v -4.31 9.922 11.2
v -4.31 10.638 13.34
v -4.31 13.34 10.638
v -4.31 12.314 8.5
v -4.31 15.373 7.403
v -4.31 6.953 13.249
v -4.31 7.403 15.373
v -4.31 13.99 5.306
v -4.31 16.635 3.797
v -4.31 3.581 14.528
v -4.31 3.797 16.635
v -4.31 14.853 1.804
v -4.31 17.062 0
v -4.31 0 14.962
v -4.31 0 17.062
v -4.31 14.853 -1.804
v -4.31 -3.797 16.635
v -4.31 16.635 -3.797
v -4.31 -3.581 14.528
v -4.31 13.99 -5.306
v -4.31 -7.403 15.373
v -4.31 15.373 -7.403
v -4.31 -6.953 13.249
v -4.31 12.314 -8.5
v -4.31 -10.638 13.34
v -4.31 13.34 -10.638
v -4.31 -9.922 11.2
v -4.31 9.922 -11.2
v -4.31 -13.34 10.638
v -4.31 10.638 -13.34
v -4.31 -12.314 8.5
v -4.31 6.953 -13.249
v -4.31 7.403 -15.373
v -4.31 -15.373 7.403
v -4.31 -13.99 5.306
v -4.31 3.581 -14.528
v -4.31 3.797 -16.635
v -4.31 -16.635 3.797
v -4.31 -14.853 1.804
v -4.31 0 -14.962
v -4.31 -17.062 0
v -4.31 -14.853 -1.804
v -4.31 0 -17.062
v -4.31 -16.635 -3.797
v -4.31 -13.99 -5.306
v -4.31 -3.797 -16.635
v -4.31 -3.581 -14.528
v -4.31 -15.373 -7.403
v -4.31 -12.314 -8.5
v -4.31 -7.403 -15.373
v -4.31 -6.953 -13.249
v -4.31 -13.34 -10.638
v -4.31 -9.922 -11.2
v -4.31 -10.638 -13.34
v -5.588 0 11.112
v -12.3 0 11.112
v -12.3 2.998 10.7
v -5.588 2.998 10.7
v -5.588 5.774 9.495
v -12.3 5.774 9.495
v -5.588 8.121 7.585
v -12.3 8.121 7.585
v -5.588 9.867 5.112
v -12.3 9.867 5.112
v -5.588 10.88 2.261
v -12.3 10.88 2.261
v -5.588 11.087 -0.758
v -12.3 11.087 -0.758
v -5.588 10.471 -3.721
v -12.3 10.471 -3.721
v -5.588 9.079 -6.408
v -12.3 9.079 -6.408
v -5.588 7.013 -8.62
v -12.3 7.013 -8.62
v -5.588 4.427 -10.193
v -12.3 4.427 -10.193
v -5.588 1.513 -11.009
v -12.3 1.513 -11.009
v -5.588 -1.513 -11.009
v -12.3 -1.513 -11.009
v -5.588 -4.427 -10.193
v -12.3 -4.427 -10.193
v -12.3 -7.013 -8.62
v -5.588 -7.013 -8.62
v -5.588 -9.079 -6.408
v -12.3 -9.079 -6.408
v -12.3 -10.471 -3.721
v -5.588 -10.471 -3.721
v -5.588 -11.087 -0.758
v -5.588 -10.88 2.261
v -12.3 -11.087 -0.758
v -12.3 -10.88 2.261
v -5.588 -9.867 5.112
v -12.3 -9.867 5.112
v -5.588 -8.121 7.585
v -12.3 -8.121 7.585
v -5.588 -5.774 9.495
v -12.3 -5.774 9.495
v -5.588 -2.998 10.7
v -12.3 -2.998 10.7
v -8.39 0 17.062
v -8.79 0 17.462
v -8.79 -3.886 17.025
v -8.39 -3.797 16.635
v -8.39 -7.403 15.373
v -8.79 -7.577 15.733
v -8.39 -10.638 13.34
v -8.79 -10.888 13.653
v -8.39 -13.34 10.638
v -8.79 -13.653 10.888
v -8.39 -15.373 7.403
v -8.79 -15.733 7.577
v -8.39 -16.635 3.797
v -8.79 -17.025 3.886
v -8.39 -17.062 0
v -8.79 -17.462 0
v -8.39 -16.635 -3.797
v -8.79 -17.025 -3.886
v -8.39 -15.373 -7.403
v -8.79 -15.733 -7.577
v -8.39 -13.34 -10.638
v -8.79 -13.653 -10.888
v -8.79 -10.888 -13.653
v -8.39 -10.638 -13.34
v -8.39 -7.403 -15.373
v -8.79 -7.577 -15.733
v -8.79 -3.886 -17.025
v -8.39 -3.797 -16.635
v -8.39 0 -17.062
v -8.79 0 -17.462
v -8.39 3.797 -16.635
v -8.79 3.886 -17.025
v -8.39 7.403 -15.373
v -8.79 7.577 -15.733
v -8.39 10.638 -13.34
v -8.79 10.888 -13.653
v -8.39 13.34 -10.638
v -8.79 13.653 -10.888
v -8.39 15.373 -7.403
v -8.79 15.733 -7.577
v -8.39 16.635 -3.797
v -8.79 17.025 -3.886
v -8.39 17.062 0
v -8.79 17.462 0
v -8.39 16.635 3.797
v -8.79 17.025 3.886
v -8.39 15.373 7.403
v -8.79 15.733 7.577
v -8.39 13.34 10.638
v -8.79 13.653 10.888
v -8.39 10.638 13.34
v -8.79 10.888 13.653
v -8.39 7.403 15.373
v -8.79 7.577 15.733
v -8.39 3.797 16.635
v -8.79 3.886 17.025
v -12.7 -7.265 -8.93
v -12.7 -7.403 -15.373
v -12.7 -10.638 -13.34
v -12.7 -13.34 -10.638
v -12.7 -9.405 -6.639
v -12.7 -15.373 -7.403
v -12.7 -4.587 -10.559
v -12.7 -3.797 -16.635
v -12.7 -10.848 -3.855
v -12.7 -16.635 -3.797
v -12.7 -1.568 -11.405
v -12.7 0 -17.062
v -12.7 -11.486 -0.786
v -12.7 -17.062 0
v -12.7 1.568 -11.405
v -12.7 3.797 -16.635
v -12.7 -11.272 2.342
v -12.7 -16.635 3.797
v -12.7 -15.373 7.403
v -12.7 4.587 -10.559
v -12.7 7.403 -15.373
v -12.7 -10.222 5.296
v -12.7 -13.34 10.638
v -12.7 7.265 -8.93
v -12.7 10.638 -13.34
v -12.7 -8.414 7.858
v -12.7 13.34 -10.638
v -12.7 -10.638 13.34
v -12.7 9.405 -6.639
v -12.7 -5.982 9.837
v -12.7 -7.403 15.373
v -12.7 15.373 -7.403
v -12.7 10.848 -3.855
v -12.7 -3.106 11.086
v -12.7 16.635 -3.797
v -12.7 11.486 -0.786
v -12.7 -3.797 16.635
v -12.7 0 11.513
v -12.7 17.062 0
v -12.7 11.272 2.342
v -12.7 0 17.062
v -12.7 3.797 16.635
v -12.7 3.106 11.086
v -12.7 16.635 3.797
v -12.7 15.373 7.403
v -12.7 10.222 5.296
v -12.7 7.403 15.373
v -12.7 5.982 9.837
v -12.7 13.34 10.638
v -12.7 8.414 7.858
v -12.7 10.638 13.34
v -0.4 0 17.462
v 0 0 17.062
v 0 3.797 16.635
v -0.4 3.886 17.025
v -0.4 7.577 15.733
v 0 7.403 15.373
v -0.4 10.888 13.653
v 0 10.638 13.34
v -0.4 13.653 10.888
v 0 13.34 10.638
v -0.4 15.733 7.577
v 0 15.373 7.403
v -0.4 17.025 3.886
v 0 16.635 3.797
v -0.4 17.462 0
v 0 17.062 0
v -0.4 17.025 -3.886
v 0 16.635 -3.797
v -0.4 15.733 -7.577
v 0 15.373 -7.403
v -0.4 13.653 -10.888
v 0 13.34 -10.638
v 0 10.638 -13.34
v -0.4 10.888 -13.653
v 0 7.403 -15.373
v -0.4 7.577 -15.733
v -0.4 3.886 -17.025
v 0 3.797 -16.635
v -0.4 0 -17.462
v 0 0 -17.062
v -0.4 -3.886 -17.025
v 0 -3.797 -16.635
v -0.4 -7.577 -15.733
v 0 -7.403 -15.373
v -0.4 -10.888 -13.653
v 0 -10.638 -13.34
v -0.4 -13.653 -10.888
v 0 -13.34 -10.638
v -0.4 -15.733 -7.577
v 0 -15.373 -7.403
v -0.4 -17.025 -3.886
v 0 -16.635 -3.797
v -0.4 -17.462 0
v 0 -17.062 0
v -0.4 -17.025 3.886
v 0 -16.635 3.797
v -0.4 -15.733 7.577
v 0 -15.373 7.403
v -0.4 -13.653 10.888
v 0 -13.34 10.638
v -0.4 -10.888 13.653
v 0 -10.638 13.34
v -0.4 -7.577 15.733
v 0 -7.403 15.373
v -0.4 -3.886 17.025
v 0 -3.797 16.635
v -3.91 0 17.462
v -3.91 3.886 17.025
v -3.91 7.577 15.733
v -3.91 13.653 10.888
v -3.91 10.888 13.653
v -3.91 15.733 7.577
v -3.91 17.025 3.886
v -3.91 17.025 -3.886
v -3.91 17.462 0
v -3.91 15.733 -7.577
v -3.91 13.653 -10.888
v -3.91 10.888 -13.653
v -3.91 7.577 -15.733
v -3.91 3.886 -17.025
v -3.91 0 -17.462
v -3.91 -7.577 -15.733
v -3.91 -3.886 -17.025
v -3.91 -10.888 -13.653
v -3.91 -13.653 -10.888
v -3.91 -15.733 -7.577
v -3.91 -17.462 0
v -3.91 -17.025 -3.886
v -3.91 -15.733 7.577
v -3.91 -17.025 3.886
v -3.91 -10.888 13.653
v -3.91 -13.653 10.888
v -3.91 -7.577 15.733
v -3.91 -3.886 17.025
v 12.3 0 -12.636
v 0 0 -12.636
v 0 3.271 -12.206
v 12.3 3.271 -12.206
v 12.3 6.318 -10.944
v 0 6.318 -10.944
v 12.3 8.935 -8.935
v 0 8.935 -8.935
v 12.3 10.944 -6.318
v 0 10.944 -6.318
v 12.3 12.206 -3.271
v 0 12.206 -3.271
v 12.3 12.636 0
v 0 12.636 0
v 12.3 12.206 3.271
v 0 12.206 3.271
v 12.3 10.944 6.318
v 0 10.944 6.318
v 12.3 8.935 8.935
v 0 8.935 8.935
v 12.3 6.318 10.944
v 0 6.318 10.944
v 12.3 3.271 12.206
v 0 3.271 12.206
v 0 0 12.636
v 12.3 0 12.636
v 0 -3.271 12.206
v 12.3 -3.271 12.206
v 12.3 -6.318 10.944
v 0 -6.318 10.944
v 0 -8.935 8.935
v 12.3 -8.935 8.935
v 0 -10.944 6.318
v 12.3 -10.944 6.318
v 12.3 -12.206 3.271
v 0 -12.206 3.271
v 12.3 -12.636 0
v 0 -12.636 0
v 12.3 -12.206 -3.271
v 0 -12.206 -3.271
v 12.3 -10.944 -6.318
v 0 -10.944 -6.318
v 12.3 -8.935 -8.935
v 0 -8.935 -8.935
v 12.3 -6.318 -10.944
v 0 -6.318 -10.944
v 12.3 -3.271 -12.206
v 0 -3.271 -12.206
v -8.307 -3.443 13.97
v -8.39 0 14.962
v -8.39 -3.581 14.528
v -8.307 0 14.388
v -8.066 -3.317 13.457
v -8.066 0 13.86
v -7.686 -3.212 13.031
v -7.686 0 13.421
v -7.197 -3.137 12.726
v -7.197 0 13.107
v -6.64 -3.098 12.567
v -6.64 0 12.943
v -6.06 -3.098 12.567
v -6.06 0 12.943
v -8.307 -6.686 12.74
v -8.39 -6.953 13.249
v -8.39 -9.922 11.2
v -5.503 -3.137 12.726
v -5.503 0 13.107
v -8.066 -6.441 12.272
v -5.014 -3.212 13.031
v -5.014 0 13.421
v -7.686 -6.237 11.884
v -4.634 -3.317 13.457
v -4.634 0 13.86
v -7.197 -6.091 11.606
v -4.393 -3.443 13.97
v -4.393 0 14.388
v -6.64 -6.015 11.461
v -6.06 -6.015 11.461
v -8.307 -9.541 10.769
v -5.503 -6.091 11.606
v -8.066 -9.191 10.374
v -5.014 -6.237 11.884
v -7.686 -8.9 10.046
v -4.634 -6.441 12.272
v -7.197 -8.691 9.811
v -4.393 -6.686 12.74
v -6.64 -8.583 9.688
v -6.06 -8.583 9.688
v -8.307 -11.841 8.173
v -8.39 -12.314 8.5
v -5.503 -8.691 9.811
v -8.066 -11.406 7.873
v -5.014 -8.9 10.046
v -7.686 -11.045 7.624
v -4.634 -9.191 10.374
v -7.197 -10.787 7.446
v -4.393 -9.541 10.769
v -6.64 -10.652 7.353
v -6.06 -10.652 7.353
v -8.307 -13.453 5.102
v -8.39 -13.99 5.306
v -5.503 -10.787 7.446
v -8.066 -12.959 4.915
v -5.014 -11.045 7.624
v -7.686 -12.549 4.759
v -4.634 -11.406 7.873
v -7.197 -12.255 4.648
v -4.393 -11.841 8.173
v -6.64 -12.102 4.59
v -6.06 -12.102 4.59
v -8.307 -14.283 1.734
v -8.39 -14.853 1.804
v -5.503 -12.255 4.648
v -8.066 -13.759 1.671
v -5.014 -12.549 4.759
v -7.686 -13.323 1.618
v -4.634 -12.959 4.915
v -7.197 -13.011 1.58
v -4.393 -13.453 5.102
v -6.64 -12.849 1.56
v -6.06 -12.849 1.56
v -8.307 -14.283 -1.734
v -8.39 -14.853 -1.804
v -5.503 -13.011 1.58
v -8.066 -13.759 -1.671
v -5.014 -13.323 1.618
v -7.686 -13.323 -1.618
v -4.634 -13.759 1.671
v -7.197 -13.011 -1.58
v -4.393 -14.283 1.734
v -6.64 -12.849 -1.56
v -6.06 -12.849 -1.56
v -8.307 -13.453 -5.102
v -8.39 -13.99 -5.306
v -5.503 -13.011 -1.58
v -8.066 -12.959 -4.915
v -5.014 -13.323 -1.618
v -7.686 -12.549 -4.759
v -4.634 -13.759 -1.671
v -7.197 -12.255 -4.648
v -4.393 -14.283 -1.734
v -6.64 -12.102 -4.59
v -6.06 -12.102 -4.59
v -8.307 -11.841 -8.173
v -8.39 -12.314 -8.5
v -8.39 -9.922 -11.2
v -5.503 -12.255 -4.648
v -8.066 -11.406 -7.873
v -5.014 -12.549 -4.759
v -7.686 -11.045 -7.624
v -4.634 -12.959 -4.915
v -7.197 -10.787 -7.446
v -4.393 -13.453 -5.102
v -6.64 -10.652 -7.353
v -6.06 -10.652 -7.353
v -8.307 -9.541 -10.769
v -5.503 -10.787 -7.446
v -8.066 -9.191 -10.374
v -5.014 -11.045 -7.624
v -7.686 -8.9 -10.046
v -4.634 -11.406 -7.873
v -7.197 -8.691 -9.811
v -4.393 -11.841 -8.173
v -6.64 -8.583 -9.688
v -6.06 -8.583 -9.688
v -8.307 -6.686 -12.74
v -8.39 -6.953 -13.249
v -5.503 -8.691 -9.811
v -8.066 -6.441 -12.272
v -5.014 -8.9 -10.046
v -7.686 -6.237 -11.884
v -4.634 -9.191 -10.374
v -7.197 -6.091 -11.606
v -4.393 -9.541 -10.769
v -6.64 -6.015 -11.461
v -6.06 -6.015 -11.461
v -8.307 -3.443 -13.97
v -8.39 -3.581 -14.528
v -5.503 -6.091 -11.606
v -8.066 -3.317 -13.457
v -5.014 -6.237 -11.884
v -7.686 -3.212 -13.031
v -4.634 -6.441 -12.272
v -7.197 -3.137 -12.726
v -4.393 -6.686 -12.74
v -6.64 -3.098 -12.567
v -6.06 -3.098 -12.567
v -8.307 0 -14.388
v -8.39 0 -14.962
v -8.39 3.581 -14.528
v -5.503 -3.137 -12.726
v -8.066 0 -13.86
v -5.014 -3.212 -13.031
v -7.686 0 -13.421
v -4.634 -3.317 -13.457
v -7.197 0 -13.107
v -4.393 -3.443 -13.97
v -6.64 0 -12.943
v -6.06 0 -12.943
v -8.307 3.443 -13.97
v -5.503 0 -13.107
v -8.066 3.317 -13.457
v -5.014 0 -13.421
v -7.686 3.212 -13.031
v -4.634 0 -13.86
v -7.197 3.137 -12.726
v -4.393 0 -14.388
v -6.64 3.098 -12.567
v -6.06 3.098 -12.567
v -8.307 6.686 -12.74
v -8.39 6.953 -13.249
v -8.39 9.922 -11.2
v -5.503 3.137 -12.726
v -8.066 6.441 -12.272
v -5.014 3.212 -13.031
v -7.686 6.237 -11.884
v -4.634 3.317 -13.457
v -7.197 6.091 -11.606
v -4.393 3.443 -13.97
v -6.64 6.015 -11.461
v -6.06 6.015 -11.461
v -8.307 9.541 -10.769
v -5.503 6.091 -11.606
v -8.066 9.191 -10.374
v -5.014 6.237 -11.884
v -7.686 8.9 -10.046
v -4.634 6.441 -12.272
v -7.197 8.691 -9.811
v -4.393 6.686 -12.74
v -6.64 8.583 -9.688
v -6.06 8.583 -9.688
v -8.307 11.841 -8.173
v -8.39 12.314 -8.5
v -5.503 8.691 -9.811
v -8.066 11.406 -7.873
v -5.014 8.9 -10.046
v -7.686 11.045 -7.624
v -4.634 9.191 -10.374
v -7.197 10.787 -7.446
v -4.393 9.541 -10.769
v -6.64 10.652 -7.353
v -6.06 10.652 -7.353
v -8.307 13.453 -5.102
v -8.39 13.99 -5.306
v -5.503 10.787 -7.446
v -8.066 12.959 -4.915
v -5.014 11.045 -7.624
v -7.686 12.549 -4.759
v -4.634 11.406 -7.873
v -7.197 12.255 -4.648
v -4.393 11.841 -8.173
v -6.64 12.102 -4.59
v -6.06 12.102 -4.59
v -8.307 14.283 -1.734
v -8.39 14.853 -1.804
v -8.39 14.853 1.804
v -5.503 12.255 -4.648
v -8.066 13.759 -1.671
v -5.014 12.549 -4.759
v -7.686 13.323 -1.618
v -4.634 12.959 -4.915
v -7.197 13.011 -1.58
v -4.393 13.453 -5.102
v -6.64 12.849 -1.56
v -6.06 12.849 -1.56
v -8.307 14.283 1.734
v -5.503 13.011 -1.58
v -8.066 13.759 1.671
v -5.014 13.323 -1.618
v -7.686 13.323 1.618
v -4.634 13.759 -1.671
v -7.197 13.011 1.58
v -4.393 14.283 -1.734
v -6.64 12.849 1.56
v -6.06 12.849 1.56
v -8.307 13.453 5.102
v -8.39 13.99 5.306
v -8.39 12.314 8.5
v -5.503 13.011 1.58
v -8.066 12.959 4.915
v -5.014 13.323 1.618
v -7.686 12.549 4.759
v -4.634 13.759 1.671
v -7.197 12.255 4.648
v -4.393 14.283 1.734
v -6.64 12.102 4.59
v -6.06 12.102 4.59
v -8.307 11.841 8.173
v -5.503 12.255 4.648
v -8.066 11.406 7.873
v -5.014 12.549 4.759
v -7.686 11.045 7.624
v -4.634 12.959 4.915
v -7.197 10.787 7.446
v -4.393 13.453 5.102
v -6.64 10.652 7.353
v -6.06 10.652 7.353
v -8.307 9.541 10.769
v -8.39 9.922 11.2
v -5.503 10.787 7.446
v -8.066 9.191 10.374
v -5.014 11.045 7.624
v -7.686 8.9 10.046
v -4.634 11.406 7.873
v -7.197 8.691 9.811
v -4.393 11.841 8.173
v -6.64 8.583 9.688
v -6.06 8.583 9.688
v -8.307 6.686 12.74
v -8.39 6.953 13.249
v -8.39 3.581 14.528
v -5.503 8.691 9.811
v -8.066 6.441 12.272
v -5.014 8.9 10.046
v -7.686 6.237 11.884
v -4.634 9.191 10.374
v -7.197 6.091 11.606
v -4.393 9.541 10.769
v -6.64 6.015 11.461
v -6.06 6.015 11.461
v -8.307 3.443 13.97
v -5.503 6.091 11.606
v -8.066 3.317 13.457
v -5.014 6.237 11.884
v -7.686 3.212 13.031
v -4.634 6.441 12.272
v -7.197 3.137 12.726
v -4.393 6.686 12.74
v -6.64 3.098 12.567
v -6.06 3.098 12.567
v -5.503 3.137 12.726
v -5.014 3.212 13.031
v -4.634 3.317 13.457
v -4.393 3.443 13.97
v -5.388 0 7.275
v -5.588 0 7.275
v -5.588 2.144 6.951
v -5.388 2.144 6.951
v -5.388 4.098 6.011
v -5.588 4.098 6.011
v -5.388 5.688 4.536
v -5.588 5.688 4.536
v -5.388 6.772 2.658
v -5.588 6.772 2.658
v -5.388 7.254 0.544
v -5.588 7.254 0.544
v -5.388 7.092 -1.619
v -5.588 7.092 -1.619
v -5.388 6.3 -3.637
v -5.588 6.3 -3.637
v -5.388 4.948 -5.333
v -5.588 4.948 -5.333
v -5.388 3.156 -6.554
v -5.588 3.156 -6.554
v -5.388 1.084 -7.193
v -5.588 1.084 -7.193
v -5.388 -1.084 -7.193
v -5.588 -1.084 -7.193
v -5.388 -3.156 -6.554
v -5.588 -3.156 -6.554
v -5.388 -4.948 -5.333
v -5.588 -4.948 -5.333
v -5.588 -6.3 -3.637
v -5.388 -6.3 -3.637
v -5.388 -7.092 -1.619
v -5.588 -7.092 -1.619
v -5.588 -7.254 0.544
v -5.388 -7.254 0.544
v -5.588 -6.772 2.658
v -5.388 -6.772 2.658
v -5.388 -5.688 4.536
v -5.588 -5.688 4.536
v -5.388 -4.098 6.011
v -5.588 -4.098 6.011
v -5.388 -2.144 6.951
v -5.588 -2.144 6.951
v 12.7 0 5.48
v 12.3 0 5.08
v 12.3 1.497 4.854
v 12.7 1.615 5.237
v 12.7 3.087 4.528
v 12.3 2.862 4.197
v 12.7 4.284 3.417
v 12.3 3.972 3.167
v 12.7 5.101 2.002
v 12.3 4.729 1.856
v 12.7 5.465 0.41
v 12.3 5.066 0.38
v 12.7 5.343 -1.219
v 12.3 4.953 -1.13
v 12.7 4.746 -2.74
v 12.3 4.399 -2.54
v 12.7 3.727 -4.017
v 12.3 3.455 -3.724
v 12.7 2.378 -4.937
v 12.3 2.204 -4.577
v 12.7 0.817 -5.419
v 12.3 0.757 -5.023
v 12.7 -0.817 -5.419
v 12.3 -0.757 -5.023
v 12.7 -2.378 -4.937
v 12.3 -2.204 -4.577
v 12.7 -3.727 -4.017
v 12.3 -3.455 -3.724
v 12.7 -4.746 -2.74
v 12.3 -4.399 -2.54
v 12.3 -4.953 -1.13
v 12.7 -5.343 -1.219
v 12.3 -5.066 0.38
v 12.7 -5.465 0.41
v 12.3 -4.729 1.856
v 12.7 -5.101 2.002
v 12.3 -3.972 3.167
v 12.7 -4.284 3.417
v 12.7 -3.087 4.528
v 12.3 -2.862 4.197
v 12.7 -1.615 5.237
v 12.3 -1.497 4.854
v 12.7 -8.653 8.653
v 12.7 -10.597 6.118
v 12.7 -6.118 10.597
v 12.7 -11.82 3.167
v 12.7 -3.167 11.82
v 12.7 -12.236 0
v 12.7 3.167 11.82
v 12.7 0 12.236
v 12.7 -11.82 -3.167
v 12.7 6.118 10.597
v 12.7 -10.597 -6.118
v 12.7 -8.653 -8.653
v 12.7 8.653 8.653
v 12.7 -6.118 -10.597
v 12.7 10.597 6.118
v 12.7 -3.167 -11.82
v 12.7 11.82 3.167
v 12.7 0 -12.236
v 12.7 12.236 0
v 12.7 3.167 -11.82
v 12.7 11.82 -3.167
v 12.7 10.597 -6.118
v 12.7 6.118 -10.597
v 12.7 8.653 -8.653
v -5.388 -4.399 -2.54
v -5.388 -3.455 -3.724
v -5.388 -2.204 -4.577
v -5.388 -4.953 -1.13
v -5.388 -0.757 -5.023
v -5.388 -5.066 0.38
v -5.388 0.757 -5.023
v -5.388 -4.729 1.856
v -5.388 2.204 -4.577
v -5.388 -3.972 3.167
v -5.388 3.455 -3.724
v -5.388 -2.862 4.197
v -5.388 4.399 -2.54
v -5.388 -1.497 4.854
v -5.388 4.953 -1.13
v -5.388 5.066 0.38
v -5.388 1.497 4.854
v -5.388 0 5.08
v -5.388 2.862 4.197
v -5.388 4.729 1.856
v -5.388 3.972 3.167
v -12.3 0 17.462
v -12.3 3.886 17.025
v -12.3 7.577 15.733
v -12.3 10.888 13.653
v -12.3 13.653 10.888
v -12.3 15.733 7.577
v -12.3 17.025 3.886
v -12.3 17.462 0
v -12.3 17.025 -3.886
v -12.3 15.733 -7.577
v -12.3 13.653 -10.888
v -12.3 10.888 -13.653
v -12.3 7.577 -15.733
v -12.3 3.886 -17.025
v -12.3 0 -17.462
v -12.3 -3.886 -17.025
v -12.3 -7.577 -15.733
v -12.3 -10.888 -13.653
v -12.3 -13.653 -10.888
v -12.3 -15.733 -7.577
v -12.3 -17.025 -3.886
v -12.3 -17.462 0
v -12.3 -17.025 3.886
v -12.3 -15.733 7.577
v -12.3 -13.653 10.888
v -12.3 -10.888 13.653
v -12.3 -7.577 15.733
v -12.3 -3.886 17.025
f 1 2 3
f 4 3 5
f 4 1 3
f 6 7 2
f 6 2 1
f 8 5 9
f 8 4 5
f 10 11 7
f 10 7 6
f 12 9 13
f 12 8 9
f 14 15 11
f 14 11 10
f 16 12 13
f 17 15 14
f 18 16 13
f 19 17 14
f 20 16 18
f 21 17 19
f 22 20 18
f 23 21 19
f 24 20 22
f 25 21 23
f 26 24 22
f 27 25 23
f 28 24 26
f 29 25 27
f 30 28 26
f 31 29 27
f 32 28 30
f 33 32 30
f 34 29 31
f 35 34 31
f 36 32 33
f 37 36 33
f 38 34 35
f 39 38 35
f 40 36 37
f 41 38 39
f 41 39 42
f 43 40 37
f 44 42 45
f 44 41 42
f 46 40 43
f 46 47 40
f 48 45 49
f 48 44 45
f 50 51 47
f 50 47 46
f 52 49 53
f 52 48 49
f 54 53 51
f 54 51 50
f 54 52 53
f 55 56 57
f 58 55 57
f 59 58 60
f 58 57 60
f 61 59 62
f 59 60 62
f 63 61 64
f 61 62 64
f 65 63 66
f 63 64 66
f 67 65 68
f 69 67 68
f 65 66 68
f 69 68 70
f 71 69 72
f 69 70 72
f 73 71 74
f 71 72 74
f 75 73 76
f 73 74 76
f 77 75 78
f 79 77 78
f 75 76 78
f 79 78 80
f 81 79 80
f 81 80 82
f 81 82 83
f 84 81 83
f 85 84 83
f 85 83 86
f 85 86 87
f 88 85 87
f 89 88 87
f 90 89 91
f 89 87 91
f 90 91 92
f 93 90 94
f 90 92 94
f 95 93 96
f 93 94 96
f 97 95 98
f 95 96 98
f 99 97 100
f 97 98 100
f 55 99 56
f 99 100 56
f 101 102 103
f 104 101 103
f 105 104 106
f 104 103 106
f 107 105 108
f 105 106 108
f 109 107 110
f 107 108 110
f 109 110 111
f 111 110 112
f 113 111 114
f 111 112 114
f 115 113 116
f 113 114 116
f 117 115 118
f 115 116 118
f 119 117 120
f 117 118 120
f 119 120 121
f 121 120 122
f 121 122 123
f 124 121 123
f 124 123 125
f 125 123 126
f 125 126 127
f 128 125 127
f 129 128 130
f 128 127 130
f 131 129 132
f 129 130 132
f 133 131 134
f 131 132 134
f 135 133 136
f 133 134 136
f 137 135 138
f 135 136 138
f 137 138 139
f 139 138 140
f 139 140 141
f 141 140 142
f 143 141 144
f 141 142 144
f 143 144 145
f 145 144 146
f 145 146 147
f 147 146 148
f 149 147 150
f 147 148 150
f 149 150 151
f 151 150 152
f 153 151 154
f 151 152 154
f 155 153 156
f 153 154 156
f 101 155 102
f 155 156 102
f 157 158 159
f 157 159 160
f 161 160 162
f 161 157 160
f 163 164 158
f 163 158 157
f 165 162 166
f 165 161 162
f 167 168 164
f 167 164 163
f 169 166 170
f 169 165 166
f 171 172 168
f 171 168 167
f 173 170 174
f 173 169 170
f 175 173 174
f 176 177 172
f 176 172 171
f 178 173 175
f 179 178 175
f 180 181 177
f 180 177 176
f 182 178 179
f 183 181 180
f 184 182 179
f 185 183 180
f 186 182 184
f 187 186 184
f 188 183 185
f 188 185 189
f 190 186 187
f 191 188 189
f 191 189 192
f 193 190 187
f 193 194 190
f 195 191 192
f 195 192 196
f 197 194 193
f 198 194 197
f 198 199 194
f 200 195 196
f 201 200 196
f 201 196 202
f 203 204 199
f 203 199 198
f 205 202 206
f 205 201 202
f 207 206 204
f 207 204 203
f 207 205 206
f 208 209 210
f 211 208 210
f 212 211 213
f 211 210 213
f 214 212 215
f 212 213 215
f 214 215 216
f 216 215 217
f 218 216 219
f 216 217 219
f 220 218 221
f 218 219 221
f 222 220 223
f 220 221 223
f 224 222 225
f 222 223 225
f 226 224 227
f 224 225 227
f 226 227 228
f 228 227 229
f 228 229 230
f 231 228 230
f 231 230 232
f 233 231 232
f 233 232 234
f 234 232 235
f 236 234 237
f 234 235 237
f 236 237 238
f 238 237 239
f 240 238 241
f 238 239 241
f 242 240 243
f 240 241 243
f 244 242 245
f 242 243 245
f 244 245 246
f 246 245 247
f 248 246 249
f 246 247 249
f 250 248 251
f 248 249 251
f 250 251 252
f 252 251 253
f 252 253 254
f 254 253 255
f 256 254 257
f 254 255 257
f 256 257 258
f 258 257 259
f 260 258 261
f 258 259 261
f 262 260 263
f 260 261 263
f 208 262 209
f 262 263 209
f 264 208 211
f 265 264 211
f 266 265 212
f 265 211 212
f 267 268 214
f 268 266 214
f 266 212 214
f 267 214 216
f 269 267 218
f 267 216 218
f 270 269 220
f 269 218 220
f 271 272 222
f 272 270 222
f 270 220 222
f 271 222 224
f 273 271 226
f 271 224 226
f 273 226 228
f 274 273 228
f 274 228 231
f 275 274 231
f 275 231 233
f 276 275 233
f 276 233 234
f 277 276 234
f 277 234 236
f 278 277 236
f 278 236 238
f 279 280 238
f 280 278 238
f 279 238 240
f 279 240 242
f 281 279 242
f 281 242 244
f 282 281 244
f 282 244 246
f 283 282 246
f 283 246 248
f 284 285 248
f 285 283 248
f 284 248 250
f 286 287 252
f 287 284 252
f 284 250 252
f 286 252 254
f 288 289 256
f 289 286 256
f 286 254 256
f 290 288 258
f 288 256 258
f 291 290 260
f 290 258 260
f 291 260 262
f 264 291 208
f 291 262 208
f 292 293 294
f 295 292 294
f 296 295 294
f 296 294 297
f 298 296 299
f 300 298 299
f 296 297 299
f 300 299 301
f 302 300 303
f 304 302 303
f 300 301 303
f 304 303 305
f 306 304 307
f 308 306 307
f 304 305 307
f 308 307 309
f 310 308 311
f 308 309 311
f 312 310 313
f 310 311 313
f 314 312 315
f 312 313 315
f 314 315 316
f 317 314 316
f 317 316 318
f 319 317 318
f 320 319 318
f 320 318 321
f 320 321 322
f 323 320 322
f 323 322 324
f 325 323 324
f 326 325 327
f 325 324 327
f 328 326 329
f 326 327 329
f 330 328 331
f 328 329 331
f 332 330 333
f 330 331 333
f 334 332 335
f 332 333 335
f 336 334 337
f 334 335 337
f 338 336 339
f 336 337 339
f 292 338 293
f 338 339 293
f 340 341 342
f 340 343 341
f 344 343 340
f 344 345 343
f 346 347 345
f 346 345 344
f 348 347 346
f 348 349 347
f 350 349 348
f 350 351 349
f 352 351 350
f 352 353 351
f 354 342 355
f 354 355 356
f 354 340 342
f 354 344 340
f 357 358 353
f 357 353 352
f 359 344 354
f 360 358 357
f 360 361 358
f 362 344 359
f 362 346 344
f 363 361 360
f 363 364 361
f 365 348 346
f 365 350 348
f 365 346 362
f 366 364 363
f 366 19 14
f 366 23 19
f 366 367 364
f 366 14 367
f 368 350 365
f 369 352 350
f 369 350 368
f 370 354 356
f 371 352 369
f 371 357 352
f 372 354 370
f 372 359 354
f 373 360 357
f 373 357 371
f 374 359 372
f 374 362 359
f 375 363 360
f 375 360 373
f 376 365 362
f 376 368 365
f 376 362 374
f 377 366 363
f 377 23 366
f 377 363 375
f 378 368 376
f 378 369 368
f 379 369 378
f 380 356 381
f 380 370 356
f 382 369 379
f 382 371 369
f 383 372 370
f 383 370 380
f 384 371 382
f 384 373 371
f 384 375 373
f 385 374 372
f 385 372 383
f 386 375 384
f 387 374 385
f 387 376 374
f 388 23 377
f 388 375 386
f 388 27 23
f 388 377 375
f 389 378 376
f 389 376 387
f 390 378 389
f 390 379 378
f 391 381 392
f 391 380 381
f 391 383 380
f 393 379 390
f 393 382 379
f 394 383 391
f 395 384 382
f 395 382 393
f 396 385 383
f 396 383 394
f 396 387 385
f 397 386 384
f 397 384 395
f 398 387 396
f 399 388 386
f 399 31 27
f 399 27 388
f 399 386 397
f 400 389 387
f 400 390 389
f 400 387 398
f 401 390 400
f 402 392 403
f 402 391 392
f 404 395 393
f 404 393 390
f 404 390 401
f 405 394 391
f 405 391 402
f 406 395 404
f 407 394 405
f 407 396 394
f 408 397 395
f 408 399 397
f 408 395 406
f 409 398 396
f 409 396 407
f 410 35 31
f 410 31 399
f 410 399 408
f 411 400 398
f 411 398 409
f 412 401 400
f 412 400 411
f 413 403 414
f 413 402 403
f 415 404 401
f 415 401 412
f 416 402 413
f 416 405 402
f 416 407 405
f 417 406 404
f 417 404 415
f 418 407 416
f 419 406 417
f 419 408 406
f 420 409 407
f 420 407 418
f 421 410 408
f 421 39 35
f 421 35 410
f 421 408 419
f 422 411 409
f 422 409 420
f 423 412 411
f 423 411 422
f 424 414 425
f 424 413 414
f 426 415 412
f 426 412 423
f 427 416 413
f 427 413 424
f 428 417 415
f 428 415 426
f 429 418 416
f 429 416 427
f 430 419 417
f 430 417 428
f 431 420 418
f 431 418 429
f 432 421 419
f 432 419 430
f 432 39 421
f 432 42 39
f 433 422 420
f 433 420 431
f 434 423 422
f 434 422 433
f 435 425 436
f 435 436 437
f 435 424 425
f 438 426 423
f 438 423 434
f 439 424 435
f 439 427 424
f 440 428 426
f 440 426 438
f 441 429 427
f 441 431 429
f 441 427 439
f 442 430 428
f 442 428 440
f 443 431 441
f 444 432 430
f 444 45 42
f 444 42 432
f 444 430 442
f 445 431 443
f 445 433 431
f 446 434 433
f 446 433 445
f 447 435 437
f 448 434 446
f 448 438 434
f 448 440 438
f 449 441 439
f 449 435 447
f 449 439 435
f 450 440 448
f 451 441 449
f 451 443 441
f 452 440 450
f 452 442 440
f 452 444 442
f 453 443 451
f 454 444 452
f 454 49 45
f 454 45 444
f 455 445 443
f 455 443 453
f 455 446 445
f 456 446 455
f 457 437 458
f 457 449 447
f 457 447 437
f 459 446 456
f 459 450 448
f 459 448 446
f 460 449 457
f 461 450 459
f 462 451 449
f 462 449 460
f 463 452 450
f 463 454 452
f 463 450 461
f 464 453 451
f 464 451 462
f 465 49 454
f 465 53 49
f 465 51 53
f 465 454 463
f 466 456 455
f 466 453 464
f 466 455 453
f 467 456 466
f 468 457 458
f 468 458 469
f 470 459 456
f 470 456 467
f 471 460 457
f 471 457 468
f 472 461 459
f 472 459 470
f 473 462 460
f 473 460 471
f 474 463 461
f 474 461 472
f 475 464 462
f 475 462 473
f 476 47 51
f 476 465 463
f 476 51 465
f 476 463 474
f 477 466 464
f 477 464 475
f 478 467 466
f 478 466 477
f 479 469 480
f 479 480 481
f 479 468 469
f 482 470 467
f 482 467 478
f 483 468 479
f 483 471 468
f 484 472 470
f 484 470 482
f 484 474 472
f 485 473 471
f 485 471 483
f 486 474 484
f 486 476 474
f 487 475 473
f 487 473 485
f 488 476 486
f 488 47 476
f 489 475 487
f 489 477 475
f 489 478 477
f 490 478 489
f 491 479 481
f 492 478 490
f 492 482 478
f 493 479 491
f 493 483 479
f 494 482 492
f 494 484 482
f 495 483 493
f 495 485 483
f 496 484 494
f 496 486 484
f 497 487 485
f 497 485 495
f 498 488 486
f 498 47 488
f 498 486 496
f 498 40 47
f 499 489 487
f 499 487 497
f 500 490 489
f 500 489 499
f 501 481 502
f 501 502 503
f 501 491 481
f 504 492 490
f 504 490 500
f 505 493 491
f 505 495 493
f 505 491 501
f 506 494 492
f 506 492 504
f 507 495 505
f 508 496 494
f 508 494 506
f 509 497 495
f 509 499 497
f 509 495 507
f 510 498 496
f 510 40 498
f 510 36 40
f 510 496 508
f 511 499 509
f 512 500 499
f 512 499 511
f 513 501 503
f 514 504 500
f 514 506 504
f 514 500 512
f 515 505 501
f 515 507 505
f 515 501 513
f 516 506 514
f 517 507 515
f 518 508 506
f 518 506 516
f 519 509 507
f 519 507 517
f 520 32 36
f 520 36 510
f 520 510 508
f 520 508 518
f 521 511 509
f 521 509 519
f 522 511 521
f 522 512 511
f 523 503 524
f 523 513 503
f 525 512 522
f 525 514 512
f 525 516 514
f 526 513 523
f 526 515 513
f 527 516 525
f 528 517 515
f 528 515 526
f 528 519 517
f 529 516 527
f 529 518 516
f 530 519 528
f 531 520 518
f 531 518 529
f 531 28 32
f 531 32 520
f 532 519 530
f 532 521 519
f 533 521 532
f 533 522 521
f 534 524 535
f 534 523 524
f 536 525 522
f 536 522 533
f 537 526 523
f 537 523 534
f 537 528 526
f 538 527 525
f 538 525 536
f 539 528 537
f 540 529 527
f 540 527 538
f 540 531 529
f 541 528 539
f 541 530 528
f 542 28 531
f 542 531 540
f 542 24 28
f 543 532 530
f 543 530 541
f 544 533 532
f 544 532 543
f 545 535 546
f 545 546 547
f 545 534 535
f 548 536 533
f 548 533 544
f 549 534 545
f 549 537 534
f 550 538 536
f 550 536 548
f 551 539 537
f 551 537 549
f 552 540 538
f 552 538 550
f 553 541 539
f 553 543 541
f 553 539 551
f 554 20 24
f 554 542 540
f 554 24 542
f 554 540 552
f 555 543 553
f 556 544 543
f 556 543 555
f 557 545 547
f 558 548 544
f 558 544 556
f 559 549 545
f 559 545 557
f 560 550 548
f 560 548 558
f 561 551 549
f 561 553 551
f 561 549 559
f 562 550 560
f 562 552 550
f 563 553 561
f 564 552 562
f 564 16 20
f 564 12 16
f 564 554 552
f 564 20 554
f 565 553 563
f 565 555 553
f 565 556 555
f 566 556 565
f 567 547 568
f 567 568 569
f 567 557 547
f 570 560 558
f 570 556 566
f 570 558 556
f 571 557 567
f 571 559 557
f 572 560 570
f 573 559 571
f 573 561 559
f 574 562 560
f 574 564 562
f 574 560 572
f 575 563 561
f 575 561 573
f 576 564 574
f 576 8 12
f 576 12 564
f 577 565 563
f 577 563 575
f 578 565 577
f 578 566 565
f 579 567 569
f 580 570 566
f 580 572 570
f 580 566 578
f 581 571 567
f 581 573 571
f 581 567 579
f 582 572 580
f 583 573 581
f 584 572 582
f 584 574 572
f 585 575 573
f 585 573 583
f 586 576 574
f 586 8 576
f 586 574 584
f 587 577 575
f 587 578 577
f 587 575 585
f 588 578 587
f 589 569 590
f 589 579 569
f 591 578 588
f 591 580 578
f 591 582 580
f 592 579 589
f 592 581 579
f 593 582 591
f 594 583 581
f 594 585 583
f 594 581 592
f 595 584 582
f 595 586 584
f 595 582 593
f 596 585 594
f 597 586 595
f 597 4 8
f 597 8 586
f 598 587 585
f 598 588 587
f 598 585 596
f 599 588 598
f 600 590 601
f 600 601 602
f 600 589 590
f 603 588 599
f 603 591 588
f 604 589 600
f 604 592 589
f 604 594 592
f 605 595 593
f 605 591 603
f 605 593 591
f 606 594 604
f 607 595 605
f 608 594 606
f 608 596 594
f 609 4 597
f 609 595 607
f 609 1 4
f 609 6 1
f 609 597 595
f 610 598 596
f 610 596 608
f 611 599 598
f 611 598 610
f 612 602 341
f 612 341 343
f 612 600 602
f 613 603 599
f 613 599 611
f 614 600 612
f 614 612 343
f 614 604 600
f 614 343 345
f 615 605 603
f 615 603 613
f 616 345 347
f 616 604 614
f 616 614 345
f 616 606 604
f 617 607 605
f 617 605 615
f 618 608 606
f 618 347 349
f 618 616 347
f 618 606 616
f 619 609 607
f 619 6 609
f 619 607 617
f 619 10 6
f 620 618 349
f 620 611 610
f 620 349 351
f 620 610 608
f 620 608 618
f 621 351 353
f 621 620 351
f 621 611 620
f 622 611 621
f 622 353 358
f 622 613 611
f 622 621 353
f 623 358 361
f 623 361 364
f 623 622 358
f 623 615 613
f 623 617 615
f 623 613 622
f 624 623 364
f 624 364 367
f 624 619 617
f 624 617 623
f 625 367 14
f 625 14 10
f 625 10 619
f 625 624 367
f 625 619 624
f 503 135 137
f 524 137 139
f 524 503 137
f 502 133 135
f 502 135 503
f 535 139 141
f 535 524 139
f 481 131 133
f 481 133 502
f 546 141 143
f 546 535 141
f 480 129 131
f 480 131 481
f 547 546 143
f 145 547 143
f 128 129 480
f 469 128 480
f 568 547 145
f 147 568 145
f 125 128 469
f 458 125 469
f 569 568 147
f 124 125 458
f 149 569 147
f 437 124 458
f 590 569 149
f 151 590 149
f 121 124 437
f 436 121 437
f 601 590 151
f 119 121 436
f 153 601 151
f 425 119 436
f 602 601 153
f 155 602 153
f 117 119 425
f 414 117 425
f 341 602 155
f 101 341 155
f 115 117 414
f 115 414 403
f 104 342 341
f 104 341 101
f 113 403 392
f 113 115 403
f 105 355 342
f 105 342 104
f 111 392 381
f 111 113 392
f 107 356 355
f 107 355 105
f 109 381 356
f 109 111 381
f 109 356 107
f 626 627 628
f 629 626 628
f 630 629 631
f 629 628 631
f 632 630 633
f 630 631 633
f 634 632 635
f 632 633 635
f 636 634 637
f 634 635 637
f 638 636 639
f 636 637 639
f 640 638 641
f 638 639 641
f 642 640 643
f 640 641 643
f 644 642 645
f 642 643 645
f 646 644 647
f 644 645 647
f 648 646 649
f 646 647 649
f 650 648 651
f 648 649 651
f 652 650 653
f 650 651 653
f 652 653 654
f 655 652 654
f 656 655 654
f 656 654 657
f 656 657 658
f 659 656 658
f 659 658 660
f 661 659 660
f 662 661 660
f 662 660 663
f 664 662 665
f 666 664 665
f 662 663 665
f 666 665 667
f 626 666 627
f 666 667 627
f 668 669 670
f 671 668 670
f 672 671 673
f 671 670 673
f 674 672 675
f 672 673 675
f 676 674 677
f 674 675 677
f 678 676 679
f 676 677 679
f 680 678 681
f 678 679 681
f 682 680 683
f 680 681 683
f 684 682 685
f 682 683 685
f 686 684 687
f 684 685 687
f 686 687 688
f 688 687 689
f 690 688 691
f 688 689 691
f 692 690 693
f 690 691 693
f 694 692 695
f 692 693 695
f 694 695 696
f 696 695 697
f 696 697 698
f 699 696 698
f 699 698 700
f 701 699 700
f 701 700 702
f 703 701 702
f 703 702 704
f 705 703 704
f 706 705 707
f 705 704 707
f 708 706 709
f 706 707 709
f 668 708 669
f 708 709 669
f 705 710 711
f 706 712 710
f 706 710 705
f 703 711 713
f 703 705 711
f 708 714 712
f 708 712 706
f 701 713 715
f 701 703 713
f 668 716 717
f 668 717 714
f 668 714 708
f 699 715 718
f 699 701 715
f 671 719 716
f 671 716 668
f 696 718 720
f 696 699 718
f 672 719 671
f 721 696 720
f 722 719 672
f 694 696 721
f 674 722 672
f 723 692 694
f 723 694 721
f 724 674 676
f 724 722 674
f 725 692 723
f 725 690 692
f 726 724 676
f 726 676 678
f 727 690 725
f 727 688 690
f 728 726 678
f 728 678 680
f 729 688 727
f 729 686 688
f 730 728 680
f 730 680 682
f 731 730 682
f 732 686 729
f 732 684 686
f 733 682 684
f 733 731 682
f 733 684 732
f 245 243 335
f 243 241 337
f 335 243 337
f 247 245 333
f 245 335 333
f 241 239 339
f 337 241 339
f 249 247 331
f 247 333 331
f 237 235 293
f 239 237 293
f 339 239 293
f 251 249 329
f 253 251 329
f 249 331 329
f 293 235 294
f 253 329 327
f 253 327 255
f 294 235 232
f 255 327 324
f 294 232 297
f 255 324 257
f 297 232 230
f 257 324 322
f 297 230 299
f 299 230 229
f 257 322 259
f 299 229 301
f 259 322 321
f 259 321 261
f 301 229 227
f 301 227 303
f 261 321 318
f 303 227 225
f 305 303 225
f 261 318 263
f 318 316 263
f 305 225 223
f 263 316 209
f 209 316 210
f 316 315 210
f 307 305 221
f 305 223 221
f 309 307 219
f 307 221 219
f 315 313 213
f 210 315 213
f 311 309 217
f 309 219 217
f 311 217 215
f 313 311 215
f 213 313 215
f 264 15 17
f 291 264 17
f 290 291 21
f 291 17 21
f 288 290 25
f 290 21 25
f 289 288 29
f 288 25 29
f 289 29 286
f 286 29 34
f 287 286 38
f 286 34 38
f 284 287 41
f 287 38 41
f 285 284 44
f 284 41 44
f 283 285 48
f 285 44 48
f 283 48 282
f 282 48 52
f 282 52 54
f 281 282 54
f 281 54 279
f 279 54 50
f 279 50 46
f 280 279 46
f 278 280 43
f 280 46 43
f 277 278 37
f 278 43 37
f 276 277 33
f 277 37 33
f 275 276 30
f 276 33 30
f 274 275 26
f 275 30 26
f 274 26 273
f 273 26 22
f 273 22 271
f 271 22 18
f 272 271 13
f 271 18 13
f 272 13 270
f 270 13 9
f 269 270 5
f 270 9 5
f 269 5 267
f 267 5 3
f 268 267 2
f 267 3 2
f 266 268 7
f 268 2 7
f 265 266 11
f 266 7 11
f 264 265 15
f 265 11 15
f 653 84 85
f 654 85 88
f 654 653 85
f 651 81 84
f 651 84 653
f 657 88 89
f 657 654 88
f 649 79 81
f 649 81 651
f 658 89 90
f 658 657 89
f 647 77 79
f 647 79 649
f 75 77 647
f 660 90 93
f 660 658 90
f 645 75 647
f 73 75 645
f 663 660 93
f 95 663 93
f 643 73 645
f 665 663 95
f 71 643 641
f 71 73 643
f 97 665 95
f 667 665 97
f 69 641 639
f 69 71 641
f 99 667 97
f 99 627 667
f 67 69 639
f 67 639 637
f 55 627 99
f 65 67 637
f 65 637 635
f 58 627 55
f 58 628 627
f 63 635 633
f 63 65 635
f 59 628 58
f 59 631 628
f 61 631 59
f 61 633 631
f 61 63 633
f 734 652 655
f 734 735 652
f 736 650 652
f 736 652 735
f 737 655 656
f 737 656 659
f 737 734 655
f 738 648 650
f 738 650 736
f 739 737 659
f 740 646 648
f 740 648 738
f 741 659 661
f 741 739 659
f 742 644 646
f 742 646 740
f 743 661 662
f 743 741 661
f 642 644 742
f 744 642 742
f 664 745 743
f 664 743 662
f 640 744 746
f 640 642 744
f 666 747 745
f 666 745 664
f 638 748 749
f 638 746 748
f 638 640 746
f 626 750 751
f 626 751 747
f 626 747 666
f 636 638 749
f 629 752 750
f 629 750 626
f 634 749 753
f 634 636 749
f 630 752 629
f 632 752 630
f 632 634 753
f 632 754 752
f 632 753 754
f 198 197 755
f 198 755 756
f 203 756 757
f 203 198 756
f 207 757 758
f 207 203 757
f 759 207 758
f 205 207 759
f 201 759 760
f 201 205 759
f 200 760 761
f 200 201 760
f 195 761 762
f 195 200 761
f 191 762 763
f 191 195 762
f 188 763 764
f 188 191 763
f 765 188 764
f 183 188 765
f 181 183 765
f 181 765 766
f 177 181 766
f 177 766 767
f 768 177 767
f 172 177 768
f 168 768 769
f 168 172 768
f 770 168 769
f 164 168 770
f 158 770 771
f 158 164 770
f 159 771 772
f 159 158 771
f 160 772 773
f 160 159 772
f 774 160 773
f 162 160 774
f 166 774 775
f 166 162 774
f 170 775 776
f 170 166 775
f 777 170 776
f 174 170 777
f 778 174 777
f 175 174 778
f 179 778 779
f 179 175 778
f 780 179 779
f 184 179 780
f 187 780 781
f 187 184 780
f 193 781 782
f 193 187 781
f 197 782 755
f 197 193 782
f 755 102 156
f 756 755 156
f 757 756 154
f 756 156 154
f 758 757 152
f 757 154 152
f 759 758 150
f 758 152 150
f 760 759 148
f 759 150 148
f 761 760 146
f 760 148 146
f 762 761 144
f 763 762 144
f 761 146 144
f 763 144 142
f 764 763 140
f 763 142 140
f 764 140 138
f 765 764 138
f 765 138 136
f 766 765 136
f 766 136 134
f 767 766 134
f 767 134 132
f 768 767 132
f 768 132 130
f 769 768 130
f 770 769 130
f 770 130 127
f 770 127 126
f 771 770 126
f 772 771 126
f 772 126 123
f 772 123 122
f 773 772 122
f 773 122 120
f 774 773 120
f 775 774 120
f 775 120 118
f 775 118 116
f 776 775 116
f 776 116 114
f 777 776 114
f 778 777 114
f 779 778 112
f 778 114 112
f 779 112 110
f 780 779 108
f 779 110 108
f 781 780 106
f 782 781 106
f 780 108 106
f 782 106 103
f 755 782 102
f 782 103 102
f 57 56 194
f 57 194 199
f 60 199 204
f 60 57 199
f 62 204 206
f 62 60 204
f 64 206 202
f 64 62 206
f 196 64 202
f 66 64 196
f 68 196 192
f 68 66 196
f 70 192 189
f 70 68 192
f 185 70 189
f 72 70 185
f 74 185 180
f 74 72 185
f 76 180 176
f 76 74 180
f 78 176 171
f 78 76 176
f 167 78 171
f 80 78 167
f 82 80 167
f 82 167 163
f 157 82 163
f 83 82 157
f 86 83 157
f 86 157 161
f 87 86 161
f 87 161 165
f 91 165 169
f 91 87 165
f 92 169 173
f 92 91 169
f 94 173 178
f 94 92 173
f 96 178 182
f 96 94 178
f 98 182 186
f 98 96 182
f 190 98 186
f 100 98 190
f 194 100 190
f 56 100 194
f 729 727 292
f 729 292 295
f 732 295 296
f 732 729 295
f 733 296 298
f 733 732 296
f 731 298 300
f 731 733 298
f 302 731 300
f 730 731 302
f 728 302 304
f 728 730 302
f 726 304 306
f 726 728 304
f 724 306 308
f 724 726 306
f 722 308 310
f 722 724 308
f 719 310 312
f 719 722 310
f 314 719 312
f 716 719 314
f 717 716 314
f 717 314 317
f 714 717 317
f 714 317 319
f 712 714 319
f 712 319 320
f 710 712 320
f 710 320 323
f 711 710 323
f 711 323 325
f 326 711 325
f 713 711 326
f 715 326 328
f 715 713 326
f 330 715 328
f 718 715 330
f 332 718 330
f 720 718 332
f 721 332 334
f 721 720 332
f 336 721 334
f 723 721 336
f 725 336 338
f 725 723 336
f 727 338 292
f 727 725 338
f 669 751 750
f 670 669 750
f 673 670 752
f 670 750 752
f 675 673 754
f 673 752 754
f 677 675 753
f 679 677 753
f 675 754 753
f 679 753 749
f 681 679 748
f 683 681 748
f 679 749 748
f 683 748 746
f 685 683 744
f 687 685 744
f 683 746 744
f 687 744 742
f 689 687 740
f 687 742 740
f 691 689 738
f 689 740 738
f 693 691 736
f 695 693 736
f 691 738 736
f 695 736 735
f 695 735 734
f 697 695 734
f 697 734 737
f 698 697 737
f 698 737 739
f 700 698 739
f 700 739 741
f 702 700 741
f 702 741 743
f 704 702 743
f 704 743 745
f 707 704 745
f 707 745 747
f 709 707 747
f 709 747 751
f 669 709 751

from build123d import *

# Parameters (mm, degrees)
SKETCH1_R           = 12.6365
BOSS_EXTRUDE1_DEPTH = 12.7
SKETCH2_R           = 17.4625
BOSS_EXTRUDE2_DEPTH = 12.7
SKETCH3_R           = 11.1125
CUT_EXTRUDE1_DEPTH  = 7.112
SKETCH4_R           = 7.27458794
CUT_EXTRUDE2_DEPTH  = 0.2
SKETCH5_R           = 5.08
CUT_EXTRUDE3_DEPTH  = 31.611330525
CHAMFER1_SIZE       = 0.4


with BuildPart() as part:
    # Sketch1 → Boss-Extrude1 (new body)
    with BuildSketch(Plane(origin=(0, 0, 0), x_dir=(0, 0, -1), z_dir=(1, 0, 0))):
        Circle(SKETCH1_R)
    extrude(amount=BOSS_EXTRUDE1_DEPTH)

    # Sketch2 → Boss-Extrude2 (add)
    with BuildSketch(Plane.ZY):
        Circle(SKETCH2_R)
    extrude(amount=BOSS_EXTRUDE2_DEPTH)

    # Sketch3 → Cut-Extrude1 (cut)
    with BuildSketch(Plane.ZY.offset(12.7)):
        Circle(SKETCH3_R)
    extrude(amount=-CUT_EXTRUDE1_DEPTH, mode=Mode.SUBTRACT)

    # Sketch4 → Cut-Extrude2 (cut)
    with BuildSketch(Plane.ZY.offset(5.588)):
        Circle(SKETCH4_R)
    extrude(amount=-CUT_EXTRUDE2_DEPTH, mode=Mode.SUBTRACT)

    # Sketch5 → Cut-Extrude3 (cut, through all)
    with BuildSketch(Plane.ZY.offset(5.388)):
        Circle(SKETCH5_R)
    extrude(amount=-CUT_EXTRUDE3_DEPTH, mode=Mode.SUBTRACT)

    # Sketch6 → Cut-Revolve1 (revolve, cut)
    with BuildSketch(Plane.XY, mode=Mode.PRIVATE) as cut_revolve1_sk:
        with BuildLine():
            Line((-8.389999984, 17.4625), (-8.389999984, 14.96249992))
            ThreePointArc((-8.389999984, 14.96249992), (-6.35, 12.922499936), (-4.310000016, 14.96249992))
            Line((-4.310000016, 14.96249992), (-4.310000016, 17.4625))
            Line((-4.310000016, 17.4625), (-8.389999984, 17.4625))
        make_face()
    revolve(cut_revolve1_sk.sketch.rotate(Axis((-6.35, 0, 0), (1, 0, 0)), 90), axis=Axis((-6.35, 0, 0), (1, 0, 0)), mode=Mode.SUBTRACT)

    # Chamfer1
    chamfer1_edges = [part.edges().sort_by_distance(p)[0] for p in [
        (-12.7, 0, -11.1125),
        (12.7, 0, -5.08),
        (-8.389999984, 0, -17.4625),
        (-4.310000016, 0, -17.4625),
        (12.7, 0, 12.6365),
        (0, 0, -17.4625),
        (-12.7, 0, -17.4625),
    ]]
    chamfer(chamfer1_edges, length=CHAMFER1_SIZE)


solid = part.part
